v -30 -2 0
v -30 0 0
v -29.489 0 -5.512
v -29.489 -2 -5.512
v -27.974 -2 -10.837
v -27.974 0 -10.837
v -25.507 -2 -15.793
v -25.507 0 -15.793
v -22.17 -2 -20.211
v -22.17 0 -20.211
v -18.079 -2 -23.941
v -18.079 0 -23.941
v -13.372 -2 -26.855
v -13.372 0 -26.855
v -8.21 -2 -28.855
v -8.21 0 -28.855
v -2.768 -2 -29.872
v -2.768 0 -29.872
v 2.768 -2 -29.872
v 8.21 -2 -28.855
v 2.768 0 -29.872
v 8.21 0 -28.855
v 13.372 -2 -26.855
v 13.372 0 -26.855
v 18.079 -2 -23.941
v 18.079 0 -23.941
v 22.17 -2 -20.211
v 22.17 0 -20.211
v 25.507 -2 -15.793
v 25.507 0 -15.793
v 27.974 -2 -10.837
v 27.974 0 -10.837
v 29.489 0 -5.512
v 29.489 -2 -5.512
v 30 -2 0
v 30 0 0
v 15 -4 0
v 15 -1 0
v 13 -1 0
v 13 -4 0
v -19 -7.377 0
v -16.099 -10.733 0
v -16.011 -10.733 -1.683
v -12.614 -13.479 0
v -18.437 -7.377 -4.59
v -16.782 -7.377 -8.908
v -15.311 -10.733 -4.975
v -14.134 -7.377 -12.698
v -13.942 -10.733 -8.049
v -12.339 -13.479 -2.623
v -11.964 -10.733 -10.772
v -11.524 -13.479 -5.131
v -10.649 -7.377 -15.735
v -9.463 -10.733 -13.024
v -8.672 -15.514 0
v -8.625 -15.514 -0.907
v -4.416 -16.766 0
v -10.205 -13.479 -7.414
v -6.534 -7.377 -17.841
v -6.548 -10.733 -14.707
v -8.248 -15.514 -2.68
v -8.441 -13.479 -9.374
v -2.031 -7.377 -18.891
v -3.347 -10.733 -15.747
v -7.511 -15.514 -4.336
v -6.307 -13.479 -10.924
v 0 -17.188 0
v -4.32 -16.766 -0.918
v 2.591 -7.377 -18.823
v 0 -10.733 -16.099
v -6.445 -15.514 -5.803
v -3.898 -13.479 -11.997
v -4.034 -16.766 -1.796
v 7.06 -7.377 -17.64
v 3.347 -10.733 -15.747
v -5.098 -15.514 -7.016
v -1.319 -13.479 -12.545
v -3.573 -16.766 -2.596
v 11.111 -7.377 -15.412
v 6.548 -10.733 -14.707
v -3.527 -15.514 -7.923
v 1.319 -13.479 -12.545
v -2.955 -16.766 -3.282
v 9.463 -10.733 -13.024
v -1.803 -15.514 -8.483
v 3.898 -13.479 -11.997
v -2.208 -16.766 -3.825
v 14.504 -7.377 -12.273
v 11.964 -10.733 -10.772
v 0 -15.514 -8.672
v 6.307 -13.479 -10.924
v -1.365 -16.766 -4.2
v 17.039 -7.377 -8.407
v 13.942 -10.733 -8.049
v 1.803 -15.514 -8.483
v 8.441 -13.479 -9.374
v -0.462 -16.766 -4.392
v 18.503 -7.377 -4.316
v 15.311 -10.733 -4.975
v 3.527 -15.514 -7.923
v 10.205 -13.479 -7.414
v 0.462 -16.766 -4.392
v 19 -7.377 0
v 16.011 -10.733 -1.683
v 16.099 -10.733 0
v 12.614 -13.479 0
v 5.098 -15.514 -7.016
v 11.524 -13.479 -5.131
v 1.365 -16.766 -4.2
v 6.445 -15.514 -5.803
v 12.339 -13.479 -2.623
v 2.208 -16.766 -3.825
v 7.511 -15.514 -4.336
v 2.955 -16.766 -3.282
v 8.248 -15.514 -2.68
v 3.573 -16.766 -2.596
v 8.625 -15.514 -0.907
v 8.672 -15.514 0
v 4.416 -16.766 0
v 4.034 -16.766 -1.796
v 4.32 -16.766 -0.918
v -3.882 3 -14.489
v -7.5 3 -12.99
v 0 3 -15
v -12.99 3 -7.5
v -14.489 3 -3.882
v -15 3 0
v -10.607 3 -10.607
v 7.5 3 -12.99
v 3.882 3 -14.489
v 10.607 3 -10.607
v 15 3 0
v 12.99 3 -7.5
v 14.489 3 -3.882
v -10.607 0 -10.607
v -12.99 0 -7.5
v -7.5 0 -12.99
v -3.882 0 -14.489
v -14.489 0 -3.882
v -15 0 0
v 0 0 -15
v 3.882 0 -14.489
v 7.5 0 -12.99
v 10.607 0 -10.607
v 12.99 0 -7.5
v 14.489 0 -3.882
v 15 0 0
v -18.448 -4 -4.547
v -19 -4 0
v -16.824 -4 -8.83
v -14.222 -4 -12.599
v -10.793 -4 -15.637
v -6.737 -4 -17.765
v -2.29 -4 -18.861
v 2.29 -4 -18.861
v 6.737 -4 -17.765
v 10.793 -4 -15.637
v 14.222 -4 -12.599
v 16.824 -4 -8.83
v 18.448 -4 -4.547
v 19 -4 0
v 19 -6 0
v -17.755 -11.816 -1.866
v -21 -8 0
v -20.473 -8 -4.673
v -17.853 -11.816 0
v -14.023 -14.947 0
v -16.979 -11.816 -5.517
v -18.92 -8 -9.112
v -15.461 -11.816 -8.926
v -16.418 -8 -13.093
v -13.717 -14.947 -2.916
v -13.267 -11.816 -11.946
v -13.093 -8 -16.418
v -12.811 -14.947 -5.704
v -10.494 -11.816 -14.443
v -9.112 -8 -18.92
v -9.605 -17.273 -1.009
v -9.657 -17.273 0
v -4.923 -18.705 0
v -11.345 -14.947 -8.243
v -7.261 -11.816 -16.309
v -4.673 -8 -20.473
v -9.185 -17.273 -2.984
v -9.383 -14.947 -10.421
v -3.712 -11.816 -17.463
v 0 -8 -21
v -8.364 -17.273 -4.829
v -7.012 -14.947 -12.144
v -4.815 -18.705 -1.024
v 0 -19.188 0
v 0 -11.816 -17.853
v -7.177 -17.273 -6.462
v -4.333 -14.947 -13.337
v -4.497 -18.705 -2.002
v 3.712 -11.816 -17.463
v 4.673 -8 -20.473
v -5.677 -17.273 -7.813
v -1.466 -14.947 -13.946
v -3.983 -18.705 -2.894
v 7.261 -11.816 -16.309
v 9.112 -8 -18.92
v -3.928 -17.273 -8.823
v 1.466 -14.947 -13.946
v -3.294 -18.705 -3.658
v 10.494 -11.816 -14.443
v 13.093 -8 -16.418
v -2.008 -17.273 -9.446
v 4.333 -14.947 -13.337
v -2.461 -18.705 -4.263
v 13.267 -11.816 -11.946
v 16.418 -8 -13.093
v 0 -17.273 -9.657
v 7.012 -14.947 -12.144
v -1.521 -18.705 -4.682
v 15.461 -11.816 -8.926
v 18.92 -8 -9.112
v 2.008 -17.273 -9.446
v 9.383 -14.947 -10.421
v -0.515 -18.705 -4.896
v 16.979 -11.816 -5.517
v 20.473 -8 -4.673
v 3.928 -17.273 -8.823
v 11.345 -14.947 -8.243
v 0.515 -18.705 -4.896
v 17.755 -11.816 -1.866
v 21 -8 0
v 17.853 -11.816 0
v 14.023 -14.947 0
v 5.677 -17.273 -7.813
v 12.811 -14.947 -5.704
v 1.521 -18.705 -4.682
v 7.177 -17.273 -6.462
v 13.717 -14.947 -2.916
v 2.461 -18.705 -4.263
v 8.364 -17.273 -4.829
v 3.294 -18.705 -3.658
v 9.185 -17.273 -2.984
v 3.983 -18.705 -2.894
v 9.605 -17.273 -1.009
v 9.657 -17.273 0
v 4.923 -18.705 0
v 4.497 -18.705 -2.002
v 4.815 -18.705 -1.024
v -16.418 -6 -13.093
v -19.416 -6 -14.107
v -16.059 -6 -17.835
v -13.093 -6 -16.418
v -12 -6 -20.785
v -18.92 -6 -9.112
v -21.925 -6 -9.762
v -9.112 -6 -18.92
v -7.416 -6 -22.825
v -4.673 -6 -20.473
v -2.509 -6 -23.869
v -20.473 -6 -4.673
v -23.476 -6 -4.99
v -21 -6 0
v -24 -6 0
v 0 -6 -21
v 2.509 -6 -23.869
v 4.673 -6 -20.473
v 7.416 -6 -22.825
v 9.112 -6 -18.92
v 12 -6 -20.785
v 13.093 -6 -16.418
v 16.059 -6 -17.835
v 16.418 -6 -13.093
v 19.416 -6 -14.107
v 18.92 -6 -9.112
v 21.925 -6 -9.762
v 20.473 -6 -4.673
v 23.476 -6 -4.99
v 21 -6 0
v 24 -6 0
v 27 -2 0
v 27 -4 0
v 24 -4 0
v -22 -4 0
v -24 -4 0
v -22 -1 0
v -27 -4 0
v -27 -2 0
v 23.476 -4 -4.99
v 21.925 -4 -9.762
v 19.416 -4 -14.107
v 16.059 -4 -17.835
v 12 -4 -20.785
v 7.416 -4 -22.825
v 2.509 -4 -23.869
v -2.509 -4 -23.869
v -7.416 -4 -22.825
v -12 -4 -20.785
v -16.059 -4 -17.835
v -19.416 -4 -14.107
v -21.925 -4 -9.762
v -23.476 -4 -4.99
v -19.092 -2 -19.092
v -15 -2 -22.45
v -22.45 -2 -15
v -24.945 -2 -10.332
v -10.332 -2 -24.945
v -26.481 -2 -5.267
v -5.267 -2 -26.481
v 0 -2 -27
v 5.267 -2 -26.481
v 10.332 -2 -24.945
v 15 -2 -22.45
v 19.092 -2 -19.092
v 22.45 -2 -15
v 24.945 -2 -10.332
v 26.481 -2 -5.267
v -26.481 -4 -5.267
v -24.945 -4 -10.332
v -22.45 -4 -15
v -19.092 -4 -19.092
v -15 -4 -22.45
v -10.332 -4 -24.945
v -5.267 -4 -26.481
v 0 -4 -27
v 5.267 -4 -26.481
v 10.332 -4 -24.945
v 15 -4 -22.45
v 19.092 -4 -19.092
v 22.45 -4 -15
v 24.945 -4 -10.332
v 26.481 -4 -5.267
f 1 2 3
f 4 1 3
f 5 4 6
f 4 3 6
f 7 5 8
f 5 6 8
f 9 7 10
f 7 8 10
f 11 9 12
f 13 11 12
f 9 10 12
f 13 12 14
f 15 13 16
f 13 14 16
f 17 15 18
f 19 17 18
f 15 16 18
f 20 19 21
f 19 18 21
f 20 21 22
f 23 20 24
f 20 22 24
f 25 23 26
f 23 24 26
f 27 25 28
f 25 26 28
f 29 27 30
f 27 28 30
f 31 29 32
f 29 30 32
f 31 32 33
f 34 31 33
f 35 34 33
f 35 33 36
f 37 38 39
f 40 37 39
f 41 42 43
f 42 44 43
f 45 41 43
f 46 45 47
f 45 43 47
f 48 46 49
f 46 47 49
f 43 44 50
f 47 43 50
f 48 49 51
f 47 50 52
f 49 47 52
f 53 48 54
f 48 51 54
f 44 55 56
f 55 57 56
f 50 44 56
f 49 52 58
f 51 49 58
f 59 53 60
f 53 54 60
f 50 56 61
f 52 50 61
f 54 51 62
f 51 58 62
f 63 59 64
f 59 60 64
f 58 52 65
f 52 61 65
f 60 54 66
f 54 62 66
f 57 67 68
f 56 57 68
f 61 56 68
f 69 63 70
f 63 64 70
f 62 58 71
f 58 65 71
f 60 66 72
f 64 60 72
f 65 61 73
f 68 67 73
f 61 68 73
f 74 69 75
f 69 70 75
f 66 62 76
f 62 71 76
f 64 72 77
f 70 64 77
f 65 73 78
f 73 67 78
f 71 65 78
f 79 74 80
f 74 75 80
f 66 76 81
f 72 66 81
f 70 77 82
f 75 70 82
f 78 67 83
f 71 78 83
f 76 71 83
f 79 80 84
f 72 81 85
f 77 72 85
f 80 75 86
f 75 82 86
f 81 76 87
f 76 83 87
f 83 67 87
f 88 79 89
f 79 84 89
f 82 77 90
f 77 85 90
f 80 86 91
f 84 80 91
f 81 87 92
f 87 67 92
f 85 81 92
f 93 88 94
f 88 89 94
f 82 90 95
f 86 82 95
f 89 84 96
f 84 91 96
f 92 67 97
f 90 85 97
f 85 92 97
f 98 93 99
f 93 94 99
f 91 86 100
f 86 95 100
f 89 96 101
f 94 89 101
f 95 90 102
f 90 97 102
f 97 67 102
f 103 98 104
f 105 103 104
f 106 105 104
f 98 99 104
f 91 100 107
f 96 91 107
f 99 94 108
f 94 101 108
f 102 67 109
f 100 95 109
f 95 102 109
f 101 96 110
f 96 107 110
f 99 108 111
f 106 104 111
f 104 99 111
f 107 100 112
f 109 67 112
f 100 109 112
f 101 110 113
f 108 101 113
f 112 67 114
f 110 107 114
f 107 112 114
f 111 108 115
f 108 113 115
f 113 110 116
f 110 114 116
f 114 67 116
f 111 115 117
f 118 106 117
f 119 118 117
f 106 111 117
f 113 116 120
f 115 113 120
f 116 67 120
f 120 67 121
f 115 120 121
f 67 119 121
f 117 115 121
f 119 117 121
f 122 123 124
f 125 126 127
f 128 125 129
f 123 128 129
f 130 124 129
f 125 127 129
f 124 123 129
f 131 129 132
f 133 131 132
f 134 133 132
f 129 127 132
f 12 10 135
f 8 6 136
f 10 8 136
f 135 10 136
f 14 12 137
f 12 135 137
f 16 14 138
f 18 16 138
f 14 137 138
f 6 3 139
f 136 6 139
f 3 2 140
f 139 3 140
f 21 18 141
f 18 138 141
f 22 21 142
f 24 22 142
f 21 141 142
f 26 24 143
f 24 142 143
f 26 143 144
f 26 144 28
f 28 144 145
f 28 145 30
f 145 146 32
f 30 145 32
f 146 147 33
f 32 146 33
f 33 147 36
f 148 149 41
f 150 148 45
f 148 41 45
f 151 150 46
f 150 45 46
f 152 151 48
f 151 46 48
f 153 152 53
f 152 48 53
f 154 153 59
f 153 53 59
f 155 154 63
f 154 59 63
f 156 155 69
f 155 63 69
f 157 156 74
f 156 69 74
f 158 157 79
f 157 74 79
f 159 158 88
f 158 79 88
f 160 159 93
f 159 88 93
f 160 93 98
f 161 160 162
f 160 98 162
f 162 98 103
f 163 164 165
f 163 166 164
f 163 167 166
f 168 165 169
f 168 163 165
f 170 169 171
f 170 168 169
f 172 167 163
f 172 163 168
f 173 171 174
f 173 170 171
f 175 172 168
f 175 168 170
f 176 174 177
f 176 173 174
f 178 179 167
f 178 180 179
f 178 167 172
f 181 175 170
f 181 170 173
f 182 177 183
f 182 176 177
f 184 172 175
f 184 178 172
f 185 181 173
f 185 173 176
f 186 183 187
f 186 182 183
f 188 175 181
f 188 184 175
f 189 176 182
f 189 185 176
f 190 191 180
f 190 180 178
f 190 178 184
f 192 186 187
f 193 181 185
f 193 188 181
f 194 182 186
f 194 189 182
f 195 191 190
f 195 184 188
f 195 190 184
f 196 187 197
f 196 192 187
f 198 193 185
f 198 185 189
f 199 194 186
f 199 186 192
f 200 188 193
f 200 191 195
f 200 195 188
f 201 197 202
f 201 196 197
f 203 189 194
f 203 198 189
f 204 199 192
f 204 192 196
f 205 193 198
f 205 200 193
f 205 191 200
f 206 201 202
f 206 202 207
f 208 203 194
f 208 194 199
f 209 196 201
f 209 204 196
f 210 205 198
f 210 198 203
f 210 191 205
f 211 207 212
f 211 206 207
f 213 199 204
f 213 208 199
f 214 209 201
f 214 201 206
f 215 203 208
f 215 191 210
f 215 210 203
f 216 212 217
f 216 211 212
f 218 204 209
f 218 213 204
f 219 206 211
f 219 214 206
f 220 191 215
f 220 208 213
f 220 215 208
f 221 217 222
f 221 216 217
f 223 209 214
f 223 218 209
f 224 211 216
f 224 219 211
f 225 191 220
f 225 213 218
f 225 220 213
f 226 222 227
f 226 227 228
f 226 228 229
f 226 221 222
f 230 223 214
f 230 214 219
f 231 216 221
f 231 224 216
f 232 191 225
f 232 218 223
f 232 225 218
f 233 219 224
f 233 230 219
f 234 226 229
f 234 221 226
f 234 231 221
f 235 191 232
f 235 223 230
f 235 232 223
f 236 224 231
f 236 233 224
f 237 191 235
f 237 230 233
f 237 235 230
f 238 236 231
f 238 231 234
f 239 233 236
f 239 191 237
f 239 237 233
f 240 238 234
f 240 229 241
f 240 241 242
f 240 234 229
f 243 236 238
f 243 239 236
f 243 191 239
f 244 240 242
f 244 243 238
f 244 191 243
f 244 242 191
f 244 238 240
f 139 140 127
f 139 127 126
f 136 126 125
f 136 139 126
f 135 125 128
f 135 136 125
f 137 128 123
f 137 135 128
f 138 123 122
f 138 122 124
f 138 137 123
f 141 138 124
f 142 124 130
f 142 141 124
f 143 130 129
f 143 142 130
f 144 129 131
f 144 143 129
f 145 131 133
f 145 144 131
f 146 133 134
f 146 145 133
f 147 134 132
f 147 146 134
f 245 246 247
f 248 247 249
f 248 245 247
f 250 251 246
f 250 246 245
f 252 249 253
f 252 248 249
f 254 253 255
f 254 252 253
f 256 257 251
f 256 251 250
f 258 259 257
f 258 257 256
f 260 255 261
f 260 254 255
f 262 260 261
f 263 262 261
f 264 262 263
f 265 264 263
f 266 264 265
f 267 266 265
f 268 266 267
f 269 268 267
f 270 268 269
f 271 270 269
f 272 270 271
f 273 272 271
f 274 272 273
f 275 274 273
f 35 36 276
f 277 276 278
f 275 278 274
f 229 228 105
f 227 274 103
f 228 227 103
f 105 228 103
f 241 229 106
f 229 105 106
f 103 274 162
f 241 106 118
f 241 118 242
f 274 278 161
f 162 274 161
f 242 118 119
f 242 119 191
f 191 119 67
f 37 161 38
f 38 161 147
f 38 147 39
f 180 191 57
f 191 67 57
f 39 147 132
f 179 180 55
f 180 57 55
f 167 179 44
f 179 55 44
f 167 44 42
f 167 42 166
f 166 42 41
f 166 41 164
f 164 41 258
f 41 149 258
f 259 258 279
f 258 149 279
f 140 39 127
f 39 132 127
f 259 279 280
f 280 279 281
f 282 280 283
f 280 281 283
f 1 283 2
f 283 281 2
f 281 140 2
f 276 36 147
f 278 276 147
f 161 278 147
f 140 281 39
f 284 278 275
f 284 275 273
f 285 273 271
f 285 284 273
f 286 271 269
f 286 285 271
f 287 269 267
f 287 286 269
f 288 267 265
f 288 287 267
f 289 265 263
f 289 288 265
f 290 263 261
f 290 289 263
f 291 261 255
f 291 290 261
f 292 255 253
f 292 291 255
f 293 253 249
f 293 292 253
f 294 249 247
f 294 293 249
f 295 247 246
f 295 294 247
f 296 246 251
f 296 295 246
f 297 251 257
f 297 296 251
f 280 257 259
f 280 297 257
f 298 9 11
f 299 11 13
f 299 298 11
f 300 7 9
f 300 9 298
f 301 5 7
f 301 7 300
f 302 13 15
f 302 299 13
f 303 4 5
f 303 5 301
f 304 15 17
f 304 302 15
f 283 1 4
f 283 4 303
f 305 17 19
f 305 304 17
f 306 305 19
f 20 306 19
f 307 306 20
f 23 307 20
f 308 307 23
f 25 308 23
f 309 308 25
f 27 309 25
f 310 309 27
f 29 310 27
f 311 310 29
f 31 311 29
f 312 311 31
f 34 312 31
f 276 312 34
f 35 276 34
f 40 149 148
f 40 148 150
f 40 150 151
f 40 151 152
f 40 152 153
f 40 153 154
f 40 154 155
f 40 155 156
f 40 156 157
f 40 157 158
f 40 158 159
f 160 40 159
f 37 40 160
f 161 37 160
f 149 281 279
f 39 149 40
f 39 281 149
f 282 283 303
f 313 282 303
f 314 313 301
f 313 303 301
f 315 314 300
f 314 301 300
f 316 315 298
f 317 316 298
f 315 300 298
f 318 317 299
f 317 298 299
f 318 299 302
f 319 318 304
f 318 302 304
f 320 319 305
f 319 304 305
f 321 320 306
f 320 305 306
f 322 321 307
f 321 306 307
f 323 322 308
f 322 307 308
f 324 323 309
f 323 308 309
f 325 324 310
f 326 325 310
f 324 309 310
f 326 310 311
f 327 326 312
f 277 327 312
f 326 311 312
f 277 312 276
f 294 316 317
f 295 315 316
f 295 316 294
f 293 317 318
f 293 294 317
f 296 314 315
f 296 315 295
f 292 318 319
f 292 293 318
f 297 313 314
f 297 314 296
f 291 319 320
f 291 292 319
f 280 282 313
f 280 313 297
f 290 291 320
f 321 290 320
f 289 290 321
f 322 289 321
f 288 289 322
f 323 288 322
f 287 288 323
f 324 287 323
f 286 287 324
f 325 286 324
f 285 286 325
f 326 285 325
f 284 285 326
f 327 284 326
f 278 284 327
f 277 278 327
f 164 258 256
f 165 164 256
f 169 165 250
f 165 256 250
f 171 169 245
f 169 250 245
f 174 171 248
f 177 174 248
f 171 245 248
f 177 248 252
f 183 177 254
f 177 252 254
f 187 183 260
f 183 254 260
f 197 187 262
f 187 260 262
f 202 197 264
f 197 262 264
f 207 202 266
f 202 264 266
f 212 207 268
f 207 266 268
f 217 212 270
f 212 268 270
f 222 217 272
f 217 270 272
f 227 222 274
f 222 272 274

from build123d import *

# Parameters (mm, degrees)
F1_DEPTH      = 3
F2_DEPTH      = 2
F4_DEPTH      = 2
F5_DEPTH      = 4
F7_DEPTH      = 2
F9_ANGLE      = 180
F10_T         = 2
F10_T4_ANGLE  = 180.000000001
F10_T6_ANGLE  = 180.000000001
F10_T8_ANGLE  = 180.000000001
F10_T10_ANGLE = 180.000000001
F11_DEPTH     = 3
F12_DEPTH     = 1
F13_DEPTH     = 3


# Not quite as in the source:
# - a shell that OpenCascade refuses in one call is made with other operations: the cavity is built on its own and cut out


with BuildPart() as f1:
    # F0 (on Front) → F1 (new body)
    with BuildSketch(Plane.XZ):
        with BuildLine():
            Line((15, 0), (-15, 0))
            ThreePointArc((-15, 0), (0, -15), (15, 0))
        make_face()
    extrude(amount=-F1_DEPTH)

    # F0 (on Front) → F2 (join)
    with BuildSketch(Plane.XZ):
        with BuildLine():
            ThreePointArc((15, 0), (0, -15), (-15, 0))
            Line((-15, 0), (-30, 0))
            ThreePointArc((-30, 0), (0, -30), (30, 0))
            Line((30, 0), (15, 0))
        make_face()
        with BuildLine():
            Line((15, 0), (-15, 0))
            ThreePointArc((-15, 0), (0, -15), (15, 0))
        make_face()
    extrude(amount=F2_DEPTH)

    # F3 (on face) → F4 (join)
    with BuildSketch(Plane.XZ.offset(2)):
        with BuildLine():
            ThreePointArc((-27, 0), (0, -27), (27, 0))
            Line((27, 0), (24, 0))
            ThreePointArc((24, 0), (0, -24), (-24, 0))
            Line((-24, 0), (-27, 0))
        make_face()
    extrude(amount=F4_DEPTH)

    # F5 (add): a face of the model
    f5_faces = [f1.faces().sort_by_distance(p)[0] for p in [
        (0, -2, -10.1859163579),
    ]]
    extrude(f5_faces, amount=F5_DEPTH)

    # F6 (on face) → F7 (join)
    with BuildSketch(Plane.XZ.offset(6)):
        with BuildLine():
            ThreePointArc((-21, 0), (0, -21), (21, 0))
            Line((21, 0), (-21, 0))
        make_face()
    extrude(amount=F7_DEPTH)

    # F8 (on face) → F9 (revolve)
    with BuildSketch(Plane.XY):
        with BuildLine():
            Line((0, -8), (-21, -8))
            ThreePointArc((-21, -8), (-11.8972036761, -16.2165961892), (0, -19.1881107091))
            Line((0, -19.1881107091), (0, -8))
        make_face()
    revolve(axis=Axis((0, 0.2930196971, 0), (0, -1, 0)), revolution_arc=F9_ANGLE)

    # F10: shell of thickness 2, made by hand


with BuildPart() as f10_core1:
    # F10_t2: copy of F1
    add(f1.part)

    # the walls: a layer under each face that stays
    f10_faces = [f10_core1.faces().sort_by_distance(p)[0] for p in [
        (0, -1, -30),
        (-20, 0, -15),
        (-25.7142857143, -2, -15),
        (0, -3, -27),
        (-23.1428571429, -4, -13.5),
        (0, -5, -24),
        (-20.5714285714, -6, -12),
        (0, -7, -21),
        (0, 1.5, -15),
        (0, 3, -7.5),
        (0, -16.2165961892, -11.8972036761),
    ]]
    thicken(f10_faces, amount=-F10_T, mode=Mode.SUBTRACT)

    # F10_s3 → F10_t4 (revolve, cut)
    with BuildSketch(Plane.XY):
        Polygon((-15.02, 0.02), (-15, -2), (-13, -2), (-13, 0), align=None)
    revolve(axis=Axis((0, 0, 0), (0, -1, 0)), revolution_arc=F10_T4_ANGLE, mode=Mode.SUBTRACT)

    # F10_s5 → F10_t6 (revolve, cut)
    with BuildSketch(Plane.XY):
        Polygon((-27.02, -2.02), (-27, 0), (-25, 0), (-25, -2), align=None)
    revolve(axis=Axis((0, -2, 0), (0, -1, 0)), revolution_arc=F10_T6_ANGLE, mode=Mode.SUBTRACT)

    # F10_s7 → F10_t8 (revolve, cut)
    with BuildSketch(Plane.XY):
        Polygon((24.02, -4.02), (24, -2), (22, -2), (22, -4), align=None)
    revolve(axis=Axis((0, -4, 0), (0, 1, 0)), revolution_arc=F10_T8_ANGLE, mode=Mode.SUBTRACT)

    # F10_s9 → F10_t10 (revolve, cut)
    with BuildSketch(Plane.XY):
        Polygon((-21.02, -6.02), (-21, -4), (-19, -4), (-19, -6), align=None)
    revolve(axis=Axis((0, -6, 0), (0, -1, 0)), revolution_arc=F10_T10_ANGLE, mode=Mode.SUBTRACT)


with BuildPart() as f1_1:
    add(f1.part)

    # what is left inside the walls is the cavity
    f10_cavity = [f10_core1.part.solids().sort_by_distance(p)[0] for p in [
        (0, -12.621798, -13.821356),
    ]]
    add(f10_cavity, mode=Mode.SUBTRACT)

    # F11 (add, through all): a face of the model
    f11_faces = [f1_1.faces().sort_by_distance(p)[0] for p in [
        (0, 1, -5.5173713605),
    ]]
    extrude(f11_faces, amount=F11_DEPTH)

    # F12 (cut): a face of the model
    f12_faces = [f1_1.faces().sort_by_distance(p)[0] for p in [
        (0, -2, -9.3370899946),
    ]]
    extrude(f12_faces, amount=-F12_DEPTH, mode=Mode.SUBTRACT)

    # F13 (add): a face of the model
    f13_faces = [f1_1.faces().sort_by_distance(p)[0] for p in [
        (0, -1, -9.3370899946),
    ]]
    extrude(f13_faces, amount=F13_DEPTH)


solid = f1_1.part
